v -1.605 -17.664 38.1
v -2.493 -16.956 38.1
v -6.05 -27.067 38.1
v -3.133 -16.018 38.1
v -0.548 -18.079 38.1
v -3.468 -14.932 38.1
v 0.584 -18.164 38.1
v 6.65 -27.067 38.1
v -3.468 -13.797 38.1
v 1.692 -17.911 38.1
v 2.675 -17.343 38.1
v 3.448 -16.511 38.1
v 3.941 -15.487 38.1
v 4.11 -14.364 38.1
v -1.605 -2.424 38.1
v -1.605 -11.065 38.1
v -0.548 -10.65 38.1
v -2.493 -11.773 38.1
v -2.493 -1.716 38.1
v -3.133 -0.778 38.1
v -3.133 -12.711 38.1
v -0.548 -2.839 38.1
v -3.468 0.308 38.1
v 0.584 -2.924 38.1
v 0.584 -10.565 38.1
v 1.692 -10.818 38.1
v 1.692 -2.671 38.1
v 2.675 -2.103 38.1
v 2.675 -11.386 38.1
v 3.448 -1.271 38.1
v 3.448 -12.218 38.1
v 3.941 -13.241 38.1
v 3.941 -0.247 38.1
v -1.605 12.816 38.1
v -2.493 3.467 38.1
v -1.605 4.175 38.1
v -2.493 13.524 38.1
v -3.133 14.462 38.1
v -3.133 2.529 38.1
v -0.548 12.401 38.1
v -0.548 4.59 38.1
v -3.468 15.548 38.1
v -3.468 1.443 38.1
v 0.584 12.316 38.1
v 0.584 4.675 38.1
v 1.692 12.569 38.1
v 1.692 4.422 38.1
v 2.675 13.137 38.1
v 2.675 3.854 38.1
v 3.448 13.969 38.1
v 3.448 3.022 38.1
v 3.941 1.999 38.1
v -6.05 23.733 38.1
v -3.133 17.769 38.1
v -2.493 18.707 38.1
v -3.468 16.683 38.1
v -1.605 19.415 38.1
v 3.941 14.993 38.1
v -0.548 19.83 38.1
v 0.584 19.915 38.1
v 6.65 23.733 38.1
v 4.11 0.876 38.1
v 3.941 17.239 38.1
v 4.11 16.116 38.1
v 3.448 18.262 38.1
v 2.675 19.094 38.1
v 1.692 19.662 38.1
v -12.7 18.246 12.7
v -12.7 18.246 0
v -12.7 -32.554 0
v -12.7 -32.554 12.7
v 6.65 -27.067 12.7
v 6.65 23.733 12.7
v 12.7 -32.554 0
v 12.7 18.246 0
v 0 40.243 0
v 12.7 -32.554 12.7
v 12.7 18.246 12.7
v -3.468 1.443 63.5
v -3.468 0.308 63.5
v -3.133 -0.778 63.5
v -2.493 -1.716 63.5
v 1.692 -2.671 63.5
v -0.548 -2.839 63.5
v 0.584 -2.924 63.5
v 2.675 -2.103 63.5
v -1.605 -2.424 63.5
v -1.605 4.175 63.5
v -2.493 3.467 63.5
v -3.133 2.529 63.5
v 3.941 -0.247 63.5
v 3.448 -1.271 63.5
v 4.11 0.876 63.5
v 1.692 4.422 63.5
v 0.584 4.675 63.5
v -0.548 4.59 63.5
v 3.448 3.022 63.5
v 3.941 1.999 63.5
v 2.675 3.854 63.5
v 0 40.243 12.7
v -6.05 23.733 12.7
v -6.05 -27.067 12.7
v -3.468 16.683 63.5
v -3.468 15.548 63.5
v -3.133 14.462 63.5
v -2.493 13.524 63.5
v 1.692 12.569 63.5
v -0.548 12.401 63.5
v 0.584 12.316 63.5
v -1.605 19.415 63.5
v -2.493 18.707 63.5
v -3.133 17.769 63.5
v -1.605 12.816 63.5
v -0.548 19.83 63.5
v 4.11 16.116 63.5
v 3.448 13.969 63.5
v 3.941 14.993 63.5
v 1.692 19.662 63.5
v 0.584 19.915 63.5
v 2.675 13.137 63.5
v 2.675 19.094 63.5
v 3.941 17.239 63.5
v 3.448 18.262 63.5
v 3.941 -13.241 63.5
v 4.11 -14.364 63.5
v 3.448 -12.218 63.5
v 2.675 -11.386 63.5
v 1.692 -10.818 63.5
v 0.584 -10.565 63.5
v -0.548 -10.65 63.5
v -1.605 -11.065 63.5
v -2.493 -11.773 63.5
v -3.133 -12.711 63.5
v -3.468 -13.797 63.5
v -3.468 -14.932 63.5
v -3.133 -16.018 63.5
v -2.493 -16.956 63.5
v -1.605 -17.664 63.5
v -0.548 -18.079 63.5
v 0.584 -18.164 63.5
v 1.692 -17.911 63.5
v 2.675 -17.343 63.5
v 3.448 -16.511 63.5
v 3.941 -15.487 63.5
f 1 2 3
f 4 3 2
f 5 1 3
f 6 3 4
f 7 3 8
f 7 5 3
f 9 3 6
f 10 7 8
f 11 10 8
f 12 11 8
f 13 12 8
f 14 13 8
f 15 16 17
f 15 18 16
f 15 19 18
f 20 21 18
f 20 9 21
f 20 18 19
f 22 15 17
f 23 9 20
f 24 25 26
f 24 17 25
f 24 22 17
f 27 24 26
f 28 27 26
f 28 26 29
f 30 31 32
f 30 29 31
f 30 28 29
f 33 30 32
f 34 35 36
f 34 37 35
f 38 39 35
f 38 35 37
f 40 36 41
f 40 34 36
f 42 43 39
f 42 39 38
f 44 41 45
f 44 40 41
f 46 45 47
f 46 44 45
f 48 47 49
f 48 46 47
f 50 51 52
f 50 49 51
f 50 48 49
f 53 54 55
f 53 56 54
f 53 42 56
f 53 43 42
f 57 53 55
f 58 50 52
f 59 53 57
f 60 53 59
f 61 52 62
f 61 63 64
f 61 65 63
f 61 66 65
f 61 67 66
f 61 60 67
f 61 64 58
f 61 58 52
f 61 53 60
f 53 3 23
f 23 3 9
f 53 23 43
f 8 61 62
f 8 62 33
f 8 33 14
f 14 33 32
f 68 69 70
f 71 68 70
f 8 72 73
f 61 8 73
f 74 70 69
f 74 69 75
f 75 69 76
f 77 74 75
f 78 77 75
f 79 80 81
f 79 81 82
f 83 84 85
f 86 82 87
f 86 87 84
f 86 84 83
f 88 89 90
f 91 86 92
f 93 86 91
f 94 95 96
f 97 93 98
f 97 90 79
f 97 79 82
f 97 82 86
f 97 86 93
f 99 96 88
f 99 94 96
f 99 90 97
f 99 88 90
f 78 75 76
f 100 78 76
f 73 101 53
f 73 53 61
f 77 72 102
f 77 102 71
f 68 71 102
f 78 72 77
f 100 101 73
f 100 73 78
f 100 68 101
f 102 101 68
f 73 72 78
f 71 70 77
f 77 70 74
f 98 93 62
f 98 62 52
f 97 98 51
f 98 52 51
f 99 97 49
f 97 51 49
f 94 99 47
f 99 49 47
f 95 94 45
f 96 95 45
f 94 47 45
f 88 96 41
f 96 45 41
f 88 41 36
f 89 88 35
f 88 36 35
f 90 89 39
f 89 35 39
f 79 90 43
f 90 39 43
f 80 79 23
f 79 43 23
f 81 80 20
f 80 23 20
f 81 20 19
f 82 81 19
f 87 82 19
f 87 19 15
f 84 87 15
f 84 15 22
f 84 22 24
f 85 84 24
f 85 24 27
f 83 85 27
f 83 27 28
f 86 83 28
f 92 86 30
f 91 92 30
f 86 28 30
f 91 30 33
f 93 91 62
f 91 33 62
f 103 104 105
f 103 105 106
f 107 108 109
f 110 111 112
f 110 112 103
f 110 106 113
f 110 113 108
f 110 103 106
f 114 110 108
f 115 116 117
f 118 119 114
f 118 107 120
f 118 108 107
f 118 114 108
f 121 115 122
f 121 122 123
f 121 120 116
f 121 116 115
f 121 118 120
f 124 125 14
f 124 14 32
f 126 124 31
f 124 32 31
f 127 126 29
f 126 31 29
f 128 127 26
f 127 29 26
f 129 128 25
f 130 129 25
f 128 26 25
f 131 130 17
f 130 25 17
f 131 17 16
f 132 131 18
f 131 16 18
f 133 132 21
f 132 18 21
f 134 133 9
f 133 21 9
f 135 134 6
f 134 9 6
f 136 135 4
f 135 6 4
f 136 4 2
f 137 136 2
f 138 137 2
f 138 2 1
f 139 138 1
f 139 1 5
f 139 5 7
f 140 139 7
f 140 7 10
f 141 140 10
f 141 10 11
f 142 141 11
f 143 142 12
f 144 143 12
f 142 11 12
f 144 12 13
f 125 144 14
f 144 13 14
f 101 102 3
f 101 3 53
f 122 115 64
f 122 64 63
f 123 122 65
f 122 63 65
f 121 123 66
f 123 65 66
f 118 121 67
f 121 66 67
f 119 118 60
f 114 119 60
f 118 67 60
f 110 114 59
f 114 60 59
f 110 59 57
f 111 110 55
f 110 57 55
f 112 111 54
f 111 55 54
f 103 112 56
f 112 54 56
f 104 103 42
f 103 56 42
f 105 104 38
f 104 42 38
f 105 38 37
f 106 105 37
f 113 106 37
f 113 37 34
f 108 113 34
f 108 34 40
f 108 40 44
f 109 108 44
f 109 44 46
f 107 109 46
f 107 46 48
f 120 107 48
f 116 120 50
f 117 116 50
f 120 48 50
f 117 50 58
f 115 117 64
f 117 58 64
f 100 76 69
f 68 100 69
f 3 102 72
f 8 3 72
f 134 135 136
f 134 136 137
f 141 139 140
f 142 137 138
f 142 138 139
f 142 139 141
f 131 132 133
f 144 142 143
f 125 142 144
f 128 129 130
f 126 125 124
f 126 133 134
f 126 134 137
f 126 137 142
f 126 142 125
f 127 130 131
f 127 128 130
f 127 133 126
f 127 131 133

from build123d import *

# Parameters (mm, degrees)
F1_DEPTH = 12.7
F2_W     = 12.7
F2_H     = 50.8
F3_DEPTH = 25.4
F4_R     = 3.81
F5_DEPTH = 25.4


with BuildPart() as f1:
    # F0 (on Top) → F1 (new body)
    with BuildSketch(Plane.XY):
        Polygon((-12.7, 18.245806), (-12.7, -32.554194), (12.7, -32.554194), (12.7, 18.245806), (0, 40.242851), align=None)
    extrude(amount=F1_DEPTH)

    # F2 (on face) → F3 (join)
    with BuildSketch(Plane.XY.offset(12.7)):
        with Locations((0.299774, -1.667303)):
            Rectangle(F2_W, F2_H)
    extrude(amount=F3_DEPTH)

    # F4 (on face) → F5 (join)
    with BuildSketch(Plane.XY.offset(38.1)):
        with Locations((0.299774, 16.11553)):
            Circle(F4_R)
        with Locations((0.299774, 0.87553)):
            Circle(F4_R)
        with Locations((0.299774, -14.36447)):
            Circle(F4_R)
    extrude(amount=F5_DEPTH)


solid = f1.part
